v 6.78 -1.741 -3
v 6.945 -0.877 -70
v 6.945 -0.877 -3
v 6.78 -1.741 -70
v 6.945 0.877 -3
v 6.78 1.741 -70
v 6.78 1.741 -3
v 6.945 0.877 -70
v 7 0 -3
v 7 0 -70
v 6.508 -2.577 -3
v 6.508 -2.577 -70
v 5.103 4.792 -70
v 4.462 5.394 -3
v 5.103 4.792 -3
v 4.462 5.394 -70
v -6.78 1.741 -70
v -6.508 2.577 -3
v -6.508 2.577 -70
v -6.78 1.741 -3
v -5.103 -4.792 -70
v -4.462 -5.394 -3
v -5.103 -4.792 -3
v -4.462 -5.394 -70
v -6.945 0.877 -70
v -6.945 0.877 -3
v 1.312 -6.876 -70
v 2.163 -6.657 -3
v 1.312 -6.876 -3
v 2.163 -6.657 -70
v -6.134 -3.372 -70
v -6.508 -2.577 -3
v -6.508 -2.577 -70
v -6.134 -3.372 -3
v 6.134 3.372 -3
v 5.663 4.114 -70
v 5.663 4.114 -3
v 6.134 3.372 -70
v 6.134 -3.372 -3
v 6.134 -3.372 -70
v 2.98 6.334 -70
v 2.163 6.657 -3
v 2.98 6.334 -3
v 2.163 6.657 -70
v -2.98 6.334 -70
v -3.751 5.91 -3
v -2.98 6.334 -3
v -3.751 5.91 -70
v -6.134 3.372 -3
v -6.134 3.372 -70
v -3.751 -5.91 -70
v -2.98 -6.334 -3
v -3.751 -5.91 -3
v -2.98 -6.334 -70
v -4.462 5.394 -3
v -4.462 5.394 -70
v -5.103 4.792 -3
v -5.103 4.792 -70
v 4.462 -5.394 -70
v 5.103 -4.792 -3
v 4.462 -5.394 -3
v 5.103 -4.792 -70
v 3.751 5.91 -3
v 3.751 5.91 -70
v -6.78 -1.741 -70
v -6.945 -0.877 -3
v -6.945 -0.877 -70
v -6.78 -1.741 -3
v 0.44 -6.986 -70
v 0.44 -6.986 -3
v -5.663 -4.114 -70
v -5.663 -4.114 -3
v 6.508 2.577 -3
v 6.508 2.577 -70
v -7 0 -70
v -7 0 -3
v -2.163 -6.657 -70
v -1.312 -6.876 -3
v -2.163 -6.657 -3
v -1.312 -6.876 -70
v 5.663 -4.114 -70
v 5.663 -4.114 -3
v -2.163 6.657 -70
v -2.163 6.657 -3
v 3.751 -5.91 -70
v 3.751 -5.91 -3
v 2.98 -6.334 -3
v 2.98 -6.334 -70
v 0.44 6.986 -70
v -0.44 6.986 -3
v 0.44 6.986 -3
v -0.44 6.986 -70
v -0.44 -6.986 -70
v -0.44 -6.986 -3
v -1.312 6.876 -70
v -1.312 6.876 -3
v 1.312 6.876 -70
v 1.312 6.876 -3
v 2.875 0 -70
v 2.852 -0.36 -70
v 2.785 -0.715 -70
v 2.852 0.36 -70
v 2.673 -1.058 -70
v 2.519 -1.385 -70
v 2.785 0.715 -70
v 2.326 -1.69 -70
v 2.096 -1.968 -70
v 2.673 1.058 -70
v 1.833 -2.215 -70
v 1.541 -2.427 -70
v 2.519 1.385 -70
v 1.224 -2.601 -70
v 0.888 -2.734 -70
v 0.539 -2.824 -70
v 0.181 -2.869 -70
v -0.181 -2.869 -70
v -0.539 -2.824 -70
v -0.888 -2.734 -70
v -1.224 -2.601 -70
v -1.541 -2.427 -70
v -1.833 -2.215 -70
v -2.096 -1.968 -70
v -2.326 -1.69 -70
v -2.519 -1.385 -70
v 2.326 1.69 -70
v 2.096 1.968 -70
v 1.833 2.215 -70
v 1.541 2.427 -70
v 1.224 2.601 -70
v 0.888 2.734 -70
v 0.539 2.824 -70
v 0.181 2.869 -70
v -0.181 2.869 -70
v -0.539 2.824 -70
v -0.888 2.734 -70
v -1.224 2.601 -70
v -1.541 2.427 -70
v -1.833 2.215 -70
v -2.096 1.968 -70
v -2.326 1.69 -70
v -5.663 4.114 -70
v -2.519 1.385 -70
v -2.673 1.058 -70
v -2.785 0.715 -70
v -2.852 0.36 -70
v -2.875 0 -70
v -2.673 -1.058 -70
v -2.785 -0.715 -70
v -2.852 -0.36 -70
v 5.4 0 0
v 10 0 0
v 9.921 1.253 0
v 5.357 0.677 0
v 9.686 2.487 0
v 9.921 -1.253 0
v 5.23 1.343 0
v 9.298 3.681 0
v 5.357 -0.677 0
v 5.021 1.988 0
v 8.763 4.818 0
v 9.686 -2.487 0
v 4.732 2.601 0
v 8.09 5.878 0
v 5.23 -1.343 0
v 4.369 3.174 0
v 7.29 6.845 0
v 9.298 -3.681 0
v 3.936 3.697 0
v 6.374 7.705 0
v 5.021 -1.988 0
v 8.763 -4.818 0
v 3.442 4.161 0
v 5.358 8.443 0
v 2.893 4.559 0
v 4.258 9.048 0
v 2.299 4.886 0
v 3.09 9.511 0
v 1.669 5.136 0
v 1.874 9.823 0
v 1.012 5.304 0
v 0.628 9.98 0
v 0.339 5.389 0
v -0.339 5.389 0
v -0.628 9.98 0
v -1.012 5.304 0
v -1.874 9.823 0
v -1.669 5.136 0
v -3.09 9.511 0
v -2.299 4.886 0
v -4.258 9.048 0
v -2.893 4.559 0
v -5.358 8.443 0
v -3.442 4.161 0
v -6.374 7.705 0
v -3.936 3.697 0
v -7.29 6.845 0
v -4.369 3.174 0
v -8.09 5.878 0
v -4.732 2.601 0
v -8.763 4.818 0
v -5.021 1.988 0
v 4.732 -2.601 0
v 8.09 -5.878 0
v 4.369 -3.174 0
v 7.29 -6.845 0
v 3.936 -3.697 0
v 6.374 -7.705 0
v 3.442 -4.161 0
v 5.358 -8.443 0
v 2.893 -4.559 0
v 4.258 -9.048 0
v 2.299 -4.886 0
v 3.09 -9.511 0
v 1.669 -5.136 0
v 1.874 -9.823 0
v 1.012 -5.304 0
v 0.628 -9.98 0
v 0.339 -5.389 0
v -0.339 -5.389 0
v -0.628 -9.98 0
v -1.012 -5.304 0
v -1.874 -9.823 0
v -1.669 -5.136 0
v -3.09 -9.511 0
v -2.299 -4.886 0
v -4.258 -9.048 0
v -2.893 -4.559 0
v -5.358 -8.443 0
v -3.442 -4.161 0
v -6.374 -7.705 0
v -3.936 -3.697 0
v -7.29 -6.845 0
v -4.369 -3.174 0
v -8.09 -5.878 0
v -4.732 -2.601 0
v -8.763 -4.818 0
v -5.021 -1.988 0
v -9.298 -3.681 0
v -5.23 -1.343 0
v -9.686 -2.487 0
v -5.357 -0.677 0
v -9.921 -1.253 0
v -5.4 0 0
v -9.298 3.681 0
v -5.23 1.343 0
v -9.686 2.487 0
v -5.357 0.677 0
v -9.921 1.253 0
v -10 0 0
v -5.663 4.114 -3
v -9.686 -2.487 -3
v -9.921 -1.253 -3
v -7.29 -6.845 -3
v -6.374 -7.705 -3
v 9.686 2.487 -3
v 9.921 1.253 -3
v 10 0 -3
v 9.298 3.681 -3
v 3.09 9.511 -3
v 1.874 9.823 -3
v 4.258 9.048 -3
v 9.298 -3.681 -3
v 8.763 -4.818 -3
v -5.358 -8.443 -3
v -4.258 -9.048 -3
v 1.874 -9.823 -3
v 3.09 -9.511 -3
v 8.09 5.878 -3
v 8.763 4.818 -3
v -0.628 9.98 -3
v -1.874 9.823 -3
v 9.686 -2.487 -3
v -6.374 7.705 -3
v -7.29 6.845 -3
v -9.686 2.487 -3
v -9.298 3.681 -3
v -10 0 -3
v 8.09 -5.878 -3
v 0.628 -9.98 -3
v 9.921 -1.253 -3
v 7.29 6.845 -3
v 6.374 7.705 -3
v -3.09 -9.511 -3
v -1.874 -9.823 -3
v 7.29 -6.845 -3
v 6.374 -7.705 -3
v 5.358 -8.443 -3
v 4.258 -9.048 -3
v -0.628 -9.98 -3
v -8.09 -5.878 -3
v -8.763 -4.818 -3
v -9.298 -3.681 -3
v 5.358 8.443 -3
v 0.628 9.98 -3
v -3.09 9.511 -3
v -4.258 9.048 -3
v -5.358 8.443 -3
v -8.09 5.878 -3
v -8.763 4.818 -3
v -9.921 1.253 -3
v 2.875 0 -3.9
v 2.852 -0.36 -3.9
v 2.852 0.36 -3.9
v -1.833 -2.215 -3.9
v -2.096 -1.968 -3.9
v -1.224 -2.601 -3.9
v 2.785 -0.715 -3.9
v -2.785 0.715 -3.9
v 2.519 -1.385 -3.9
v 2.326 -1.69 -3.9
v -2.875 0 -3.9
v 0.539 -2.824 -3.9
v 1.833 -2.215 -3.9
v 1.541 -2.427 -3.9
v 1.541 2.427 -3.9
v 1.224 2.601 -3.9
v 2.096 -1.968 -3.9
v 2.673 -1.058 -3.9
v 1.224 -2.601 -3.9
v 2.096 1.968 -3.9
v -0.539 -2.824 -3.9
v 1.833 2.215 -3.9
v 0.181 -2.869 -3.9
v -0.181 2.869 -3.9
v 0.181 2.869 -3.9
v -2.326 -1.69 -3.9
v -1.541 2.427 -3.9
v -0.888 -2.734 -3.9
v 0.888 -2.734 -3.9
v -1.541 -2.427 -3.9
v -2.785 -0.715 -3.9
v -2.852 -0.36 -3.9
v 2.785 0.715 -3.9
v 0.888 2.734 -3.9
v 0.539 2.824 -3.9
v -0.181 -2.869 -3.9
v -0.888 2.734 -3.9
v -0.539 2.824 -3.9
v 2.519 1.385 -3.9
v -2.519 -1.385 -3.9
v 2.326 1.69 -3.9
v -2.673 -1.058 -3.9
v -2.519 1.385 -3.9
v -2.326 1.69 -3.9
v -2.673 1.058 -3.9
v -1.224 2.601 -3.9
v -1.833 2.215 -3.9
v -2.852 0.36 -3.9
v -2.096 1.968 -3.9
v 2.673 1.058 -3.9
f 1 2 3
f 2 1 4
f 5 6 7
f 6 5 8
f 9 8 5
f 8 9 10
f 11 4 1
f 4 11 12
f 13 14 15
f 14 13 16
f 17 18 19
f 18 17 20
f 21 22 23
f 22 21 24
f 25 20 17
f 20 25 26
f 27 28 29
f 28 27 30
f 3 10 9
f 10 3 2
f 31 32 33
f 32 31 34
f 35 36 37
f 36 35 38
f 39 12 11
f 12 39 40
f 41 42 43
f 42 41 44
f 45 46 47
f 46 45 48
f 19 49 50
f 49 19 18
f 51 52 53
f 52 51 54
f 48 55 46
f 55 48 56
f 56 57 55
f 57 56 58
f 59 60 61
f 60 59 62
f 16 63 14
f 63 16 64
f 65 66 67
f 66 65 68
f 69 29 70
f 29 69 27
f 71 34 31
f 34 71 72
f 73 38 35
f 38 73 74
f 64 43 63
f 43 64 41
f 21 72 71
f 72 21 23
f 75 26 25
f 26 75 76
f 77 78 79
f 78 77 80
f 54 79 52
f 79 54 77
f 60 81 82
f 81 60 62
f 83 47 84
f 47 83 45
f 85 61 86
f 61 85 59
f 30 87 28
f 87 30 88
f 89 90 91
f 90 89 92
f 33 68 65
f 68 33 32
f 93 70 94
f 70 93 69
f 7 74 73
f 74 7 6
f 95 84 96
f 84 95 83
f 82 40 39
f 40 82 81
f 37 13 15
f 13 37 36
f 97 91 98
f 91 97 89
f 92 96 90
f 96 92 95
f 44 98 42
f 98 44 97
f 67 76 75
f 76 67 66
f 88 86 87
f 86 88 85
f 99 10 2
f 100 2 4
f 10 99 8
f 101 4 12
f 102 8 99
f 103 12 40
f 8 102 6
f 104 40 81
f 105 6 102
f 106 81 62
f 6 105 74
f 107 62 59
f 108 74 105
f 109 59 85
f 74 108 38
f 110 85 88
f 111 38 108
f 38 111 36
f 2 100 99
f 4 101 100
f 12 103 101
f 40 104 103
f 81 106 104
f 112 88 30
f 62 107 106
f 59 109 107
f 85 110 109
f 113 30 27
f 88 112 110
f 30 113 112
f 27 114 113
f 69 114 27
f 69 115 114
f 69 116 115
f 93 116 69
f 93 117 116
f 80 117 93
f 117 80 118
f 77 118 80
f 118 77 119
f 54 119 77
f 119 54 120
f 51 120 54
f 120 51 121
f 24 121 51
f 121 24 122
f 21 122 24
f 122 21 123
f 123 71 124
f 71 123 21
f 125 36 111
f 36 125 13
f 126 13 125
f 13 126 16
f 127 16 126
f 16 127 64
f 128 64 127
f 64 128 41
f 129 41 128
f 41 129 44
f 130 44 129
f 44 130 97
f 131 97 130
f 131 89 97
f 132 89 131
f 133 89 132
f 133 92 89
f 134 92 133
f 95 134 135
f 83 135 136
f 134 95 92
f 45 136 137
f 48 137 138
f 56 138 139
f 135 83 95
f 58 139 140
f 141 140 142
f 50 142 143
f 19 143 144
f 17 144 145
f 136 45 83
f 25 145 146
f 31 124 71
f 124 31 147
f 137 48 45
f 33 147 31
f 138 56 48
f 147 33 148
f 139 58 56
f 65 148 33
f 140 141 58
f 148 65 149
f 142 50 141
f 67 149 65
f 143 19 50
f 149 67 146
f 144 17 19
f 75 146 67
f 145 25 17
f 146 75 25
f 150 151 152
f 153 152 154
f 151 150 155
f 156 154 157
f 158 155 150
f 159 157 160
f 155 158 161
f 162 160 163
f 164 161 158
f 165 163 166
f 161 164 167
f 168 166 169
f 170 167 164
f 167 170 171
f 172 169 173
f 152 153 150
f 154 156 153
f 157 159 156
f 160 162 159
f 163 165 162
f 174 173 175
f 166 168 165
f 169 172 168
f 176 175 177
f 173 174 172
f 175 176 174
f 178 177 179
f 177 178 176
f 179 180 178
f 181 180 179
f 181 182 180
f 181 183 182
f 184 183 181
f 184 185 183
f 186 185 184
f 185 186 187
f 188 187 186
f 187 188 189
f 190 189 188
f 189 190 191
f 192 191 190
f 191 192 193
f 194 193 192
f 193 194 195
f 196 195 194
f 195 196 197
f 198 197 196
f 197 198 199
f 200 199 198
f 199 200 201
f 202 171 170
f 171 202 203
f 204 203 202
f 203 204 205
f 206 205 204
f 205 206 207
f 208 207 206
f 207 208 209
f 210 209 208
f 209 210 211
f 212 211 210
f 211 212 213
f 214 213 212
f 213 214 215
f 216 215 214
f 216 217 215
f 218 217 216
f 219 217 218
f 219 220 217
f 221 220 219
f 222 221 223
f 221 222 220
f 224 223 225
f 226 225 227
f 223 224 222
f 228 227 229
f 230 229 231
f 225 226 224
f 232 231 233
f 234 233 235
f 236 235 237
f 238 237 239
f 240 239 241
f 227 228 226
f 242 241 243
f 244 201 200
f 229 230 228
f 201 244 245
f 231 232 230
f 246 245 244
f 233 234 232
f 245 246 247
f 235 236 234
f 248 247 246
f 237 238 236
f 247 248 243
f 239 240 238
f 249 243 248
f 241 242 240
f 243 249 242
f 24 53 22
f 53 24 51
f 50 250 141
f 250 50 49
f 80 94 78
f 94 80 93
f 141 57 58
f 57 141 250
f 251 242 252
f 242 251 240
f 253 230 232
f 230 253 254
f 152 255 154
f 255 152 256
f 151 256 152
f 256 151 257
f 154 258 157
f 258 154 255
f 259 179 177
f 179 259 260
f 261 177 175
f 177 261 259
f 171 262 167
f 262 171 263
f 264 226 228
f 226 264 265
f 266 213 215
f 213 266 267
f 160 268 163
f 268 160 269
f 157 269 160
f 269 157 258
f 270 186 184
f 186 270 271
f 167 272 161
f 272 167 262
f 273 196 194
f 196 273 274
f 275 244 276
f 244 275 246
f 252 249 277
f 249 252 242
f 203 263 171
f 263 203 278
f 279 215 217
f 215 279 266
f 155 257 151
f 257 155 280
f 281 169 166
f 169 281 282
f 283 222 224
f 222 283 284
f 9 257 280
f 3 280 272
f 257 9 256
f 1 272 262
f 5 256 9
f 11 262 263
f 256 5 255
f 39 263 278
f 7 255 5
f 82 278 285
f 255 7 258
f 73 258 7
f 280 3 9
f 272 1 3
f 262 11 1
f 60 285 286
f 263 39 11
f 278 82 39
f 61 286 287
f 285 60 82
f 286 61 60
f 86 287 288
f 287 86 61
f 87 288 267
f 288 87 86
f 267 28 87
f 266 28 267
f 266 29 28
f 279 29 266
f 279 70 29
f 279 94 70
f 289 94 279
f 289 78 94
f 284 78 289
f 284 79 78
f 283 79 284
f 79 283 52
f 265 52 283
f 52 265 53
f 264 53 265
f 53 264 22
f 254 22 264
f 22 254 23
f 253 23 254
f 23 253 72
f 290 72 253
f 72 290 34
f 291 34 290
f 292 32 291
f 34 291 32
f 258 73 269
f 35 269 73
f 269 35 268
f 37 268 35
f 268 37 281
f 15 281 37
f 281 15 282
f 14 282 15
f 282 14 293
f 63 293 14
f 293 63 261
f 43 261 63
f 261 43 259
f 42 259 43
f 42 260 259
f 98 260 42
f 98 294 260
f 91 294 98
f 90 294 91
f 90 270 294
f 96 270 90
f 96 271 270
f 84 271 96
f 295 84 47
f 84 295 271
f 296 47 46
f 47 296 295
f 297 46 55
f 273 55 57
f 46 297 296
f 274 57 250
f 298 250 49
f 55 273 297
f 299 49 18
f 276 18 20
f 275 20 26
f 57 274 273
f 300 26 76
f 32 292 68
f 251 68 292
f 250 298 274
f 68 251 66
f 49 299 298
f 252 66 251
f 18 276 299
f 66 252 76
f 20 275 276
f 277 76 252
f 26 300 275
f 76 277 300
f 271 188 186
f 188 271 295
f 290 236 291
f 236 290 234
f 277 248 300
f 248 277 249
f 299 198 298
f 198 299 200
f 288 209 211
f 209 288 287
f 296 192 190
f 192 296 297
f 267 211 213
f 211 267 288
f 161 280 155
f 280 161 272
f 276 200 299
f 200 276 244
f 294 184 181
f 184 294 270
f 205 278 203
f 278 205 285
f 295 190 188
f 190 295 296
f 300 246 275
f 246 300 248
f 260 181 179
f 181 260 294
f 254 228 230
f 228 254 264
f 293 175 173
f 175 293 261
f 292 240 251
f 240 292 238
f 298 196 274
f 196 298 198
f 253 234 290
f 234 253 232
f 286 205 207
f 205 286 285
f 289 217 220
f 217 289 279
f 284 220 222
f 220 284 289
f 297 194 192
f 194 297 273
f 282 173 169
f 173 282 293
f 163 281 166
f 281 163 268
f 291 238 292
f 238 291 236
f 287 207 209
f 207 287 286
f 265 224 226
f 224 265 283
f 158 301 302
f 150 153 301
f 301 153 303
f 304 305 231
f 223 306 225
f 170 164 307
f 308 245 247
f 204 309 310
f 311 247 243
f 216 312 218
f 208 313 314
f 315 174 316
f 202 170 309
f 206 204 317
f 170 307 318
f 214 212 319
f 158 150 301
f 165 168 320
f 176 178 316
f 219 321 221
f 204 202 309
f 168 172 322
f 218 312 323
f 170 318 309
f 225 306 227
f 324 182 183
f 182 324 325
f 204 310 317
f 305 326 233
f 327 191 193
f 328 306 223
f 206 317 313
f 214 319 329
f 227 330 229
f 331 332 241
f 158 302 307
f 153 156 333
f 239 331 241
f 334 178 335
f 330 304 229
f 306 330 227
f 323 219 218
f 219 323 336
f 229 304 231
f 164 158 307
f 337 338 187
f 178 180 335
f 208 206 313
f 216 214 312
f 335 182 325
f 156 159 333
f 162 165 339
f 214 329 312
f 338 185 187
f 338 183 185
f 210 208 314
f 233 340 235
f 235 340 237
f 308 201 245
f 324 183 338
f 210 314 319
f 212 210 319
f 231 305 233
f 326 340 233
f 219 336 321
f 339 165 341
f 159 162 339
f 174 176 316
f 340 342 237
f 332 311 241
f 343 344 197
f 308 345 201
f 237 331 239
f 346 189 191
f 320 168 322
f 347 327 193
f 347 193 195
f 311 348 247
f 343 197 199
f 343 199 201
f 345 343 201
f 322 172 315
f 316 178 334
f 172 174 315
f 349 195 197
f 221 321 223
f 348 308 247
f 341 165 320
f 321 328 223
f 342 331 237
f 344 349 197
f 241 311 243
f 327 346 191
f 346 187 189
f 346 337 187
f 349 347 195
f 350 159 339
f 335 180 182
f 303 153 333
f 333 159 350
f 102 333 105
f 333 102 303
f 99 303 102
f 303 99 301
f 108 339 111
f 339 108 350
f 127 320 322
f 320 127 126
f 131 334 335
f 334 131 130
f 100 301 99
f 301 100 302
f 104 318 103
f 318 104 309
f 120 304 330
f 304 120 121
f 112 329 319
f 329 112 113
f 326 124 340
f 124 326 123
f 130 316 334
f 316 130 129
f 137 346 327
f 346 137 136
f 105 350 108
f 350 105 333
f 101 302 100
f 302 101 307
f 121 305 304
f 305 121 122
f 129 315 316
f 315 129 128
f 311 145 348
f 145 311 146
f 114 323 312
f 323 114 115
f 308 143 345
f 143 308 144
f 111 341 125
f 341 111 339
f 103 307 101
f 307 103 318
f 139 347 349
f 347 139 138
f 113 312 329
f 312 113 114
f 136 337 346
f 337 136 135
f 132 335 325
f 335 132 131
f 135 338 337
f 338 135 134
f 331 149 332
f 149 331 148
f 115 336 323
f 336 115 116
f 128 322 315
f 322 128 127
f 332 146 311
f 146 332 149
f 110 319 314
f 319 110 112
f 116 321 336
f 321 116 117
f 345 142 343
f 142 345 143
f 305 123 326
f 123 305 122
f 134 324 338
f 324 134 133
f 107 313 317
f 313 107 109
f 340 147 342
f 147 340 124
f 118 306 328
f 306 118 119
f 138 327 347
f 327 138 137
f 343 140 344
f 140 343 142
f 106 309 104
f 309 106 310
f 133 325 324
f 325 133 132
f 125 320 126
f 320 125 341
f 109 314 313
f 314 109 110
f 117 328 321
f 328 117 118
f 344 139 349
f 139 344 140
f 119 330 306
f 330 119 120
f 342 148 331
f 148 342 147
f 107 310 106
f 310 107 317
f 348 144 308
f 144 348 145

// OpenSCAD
$fn = 50;


difference() {
	union() {
		translate(v = [0, 0, -70.0000000000]) {
			cylinder(h = 70, r = 7.0000000000);
		}
		translate(v = [0, 0, -3.0000000000]) {
			cylinder(h = 3, r = 10.0000000000);
		}
	}
	union() {
		translate(v = [0, 0, 0]) {
			rotate(a = [0, 0, 0]) {
				difference() {
					union() {
						#translate(v = [0, 0, -70.0000000000]) {
							cylinder(h = 70, r = 2.6000000000);
						}
						#translate(v = [0, 0, -3.9000000000]) {
							cylinder(h = 3.9000000000, r = 7.0000000000, r1 = 2.8750000000, r2 = 5.4000000000);
						}
						#translate(v = [0, 0, -70.0000000000]) {
							cylinder(h = 70, r = 2.8750000000);
						}
						#translate(v = [0, 0, -70.0000000000]) {
							cylinder(h = 70, r = 2.6000000000);
						}
					}
					union();
				}
			}
		}
	}
}
